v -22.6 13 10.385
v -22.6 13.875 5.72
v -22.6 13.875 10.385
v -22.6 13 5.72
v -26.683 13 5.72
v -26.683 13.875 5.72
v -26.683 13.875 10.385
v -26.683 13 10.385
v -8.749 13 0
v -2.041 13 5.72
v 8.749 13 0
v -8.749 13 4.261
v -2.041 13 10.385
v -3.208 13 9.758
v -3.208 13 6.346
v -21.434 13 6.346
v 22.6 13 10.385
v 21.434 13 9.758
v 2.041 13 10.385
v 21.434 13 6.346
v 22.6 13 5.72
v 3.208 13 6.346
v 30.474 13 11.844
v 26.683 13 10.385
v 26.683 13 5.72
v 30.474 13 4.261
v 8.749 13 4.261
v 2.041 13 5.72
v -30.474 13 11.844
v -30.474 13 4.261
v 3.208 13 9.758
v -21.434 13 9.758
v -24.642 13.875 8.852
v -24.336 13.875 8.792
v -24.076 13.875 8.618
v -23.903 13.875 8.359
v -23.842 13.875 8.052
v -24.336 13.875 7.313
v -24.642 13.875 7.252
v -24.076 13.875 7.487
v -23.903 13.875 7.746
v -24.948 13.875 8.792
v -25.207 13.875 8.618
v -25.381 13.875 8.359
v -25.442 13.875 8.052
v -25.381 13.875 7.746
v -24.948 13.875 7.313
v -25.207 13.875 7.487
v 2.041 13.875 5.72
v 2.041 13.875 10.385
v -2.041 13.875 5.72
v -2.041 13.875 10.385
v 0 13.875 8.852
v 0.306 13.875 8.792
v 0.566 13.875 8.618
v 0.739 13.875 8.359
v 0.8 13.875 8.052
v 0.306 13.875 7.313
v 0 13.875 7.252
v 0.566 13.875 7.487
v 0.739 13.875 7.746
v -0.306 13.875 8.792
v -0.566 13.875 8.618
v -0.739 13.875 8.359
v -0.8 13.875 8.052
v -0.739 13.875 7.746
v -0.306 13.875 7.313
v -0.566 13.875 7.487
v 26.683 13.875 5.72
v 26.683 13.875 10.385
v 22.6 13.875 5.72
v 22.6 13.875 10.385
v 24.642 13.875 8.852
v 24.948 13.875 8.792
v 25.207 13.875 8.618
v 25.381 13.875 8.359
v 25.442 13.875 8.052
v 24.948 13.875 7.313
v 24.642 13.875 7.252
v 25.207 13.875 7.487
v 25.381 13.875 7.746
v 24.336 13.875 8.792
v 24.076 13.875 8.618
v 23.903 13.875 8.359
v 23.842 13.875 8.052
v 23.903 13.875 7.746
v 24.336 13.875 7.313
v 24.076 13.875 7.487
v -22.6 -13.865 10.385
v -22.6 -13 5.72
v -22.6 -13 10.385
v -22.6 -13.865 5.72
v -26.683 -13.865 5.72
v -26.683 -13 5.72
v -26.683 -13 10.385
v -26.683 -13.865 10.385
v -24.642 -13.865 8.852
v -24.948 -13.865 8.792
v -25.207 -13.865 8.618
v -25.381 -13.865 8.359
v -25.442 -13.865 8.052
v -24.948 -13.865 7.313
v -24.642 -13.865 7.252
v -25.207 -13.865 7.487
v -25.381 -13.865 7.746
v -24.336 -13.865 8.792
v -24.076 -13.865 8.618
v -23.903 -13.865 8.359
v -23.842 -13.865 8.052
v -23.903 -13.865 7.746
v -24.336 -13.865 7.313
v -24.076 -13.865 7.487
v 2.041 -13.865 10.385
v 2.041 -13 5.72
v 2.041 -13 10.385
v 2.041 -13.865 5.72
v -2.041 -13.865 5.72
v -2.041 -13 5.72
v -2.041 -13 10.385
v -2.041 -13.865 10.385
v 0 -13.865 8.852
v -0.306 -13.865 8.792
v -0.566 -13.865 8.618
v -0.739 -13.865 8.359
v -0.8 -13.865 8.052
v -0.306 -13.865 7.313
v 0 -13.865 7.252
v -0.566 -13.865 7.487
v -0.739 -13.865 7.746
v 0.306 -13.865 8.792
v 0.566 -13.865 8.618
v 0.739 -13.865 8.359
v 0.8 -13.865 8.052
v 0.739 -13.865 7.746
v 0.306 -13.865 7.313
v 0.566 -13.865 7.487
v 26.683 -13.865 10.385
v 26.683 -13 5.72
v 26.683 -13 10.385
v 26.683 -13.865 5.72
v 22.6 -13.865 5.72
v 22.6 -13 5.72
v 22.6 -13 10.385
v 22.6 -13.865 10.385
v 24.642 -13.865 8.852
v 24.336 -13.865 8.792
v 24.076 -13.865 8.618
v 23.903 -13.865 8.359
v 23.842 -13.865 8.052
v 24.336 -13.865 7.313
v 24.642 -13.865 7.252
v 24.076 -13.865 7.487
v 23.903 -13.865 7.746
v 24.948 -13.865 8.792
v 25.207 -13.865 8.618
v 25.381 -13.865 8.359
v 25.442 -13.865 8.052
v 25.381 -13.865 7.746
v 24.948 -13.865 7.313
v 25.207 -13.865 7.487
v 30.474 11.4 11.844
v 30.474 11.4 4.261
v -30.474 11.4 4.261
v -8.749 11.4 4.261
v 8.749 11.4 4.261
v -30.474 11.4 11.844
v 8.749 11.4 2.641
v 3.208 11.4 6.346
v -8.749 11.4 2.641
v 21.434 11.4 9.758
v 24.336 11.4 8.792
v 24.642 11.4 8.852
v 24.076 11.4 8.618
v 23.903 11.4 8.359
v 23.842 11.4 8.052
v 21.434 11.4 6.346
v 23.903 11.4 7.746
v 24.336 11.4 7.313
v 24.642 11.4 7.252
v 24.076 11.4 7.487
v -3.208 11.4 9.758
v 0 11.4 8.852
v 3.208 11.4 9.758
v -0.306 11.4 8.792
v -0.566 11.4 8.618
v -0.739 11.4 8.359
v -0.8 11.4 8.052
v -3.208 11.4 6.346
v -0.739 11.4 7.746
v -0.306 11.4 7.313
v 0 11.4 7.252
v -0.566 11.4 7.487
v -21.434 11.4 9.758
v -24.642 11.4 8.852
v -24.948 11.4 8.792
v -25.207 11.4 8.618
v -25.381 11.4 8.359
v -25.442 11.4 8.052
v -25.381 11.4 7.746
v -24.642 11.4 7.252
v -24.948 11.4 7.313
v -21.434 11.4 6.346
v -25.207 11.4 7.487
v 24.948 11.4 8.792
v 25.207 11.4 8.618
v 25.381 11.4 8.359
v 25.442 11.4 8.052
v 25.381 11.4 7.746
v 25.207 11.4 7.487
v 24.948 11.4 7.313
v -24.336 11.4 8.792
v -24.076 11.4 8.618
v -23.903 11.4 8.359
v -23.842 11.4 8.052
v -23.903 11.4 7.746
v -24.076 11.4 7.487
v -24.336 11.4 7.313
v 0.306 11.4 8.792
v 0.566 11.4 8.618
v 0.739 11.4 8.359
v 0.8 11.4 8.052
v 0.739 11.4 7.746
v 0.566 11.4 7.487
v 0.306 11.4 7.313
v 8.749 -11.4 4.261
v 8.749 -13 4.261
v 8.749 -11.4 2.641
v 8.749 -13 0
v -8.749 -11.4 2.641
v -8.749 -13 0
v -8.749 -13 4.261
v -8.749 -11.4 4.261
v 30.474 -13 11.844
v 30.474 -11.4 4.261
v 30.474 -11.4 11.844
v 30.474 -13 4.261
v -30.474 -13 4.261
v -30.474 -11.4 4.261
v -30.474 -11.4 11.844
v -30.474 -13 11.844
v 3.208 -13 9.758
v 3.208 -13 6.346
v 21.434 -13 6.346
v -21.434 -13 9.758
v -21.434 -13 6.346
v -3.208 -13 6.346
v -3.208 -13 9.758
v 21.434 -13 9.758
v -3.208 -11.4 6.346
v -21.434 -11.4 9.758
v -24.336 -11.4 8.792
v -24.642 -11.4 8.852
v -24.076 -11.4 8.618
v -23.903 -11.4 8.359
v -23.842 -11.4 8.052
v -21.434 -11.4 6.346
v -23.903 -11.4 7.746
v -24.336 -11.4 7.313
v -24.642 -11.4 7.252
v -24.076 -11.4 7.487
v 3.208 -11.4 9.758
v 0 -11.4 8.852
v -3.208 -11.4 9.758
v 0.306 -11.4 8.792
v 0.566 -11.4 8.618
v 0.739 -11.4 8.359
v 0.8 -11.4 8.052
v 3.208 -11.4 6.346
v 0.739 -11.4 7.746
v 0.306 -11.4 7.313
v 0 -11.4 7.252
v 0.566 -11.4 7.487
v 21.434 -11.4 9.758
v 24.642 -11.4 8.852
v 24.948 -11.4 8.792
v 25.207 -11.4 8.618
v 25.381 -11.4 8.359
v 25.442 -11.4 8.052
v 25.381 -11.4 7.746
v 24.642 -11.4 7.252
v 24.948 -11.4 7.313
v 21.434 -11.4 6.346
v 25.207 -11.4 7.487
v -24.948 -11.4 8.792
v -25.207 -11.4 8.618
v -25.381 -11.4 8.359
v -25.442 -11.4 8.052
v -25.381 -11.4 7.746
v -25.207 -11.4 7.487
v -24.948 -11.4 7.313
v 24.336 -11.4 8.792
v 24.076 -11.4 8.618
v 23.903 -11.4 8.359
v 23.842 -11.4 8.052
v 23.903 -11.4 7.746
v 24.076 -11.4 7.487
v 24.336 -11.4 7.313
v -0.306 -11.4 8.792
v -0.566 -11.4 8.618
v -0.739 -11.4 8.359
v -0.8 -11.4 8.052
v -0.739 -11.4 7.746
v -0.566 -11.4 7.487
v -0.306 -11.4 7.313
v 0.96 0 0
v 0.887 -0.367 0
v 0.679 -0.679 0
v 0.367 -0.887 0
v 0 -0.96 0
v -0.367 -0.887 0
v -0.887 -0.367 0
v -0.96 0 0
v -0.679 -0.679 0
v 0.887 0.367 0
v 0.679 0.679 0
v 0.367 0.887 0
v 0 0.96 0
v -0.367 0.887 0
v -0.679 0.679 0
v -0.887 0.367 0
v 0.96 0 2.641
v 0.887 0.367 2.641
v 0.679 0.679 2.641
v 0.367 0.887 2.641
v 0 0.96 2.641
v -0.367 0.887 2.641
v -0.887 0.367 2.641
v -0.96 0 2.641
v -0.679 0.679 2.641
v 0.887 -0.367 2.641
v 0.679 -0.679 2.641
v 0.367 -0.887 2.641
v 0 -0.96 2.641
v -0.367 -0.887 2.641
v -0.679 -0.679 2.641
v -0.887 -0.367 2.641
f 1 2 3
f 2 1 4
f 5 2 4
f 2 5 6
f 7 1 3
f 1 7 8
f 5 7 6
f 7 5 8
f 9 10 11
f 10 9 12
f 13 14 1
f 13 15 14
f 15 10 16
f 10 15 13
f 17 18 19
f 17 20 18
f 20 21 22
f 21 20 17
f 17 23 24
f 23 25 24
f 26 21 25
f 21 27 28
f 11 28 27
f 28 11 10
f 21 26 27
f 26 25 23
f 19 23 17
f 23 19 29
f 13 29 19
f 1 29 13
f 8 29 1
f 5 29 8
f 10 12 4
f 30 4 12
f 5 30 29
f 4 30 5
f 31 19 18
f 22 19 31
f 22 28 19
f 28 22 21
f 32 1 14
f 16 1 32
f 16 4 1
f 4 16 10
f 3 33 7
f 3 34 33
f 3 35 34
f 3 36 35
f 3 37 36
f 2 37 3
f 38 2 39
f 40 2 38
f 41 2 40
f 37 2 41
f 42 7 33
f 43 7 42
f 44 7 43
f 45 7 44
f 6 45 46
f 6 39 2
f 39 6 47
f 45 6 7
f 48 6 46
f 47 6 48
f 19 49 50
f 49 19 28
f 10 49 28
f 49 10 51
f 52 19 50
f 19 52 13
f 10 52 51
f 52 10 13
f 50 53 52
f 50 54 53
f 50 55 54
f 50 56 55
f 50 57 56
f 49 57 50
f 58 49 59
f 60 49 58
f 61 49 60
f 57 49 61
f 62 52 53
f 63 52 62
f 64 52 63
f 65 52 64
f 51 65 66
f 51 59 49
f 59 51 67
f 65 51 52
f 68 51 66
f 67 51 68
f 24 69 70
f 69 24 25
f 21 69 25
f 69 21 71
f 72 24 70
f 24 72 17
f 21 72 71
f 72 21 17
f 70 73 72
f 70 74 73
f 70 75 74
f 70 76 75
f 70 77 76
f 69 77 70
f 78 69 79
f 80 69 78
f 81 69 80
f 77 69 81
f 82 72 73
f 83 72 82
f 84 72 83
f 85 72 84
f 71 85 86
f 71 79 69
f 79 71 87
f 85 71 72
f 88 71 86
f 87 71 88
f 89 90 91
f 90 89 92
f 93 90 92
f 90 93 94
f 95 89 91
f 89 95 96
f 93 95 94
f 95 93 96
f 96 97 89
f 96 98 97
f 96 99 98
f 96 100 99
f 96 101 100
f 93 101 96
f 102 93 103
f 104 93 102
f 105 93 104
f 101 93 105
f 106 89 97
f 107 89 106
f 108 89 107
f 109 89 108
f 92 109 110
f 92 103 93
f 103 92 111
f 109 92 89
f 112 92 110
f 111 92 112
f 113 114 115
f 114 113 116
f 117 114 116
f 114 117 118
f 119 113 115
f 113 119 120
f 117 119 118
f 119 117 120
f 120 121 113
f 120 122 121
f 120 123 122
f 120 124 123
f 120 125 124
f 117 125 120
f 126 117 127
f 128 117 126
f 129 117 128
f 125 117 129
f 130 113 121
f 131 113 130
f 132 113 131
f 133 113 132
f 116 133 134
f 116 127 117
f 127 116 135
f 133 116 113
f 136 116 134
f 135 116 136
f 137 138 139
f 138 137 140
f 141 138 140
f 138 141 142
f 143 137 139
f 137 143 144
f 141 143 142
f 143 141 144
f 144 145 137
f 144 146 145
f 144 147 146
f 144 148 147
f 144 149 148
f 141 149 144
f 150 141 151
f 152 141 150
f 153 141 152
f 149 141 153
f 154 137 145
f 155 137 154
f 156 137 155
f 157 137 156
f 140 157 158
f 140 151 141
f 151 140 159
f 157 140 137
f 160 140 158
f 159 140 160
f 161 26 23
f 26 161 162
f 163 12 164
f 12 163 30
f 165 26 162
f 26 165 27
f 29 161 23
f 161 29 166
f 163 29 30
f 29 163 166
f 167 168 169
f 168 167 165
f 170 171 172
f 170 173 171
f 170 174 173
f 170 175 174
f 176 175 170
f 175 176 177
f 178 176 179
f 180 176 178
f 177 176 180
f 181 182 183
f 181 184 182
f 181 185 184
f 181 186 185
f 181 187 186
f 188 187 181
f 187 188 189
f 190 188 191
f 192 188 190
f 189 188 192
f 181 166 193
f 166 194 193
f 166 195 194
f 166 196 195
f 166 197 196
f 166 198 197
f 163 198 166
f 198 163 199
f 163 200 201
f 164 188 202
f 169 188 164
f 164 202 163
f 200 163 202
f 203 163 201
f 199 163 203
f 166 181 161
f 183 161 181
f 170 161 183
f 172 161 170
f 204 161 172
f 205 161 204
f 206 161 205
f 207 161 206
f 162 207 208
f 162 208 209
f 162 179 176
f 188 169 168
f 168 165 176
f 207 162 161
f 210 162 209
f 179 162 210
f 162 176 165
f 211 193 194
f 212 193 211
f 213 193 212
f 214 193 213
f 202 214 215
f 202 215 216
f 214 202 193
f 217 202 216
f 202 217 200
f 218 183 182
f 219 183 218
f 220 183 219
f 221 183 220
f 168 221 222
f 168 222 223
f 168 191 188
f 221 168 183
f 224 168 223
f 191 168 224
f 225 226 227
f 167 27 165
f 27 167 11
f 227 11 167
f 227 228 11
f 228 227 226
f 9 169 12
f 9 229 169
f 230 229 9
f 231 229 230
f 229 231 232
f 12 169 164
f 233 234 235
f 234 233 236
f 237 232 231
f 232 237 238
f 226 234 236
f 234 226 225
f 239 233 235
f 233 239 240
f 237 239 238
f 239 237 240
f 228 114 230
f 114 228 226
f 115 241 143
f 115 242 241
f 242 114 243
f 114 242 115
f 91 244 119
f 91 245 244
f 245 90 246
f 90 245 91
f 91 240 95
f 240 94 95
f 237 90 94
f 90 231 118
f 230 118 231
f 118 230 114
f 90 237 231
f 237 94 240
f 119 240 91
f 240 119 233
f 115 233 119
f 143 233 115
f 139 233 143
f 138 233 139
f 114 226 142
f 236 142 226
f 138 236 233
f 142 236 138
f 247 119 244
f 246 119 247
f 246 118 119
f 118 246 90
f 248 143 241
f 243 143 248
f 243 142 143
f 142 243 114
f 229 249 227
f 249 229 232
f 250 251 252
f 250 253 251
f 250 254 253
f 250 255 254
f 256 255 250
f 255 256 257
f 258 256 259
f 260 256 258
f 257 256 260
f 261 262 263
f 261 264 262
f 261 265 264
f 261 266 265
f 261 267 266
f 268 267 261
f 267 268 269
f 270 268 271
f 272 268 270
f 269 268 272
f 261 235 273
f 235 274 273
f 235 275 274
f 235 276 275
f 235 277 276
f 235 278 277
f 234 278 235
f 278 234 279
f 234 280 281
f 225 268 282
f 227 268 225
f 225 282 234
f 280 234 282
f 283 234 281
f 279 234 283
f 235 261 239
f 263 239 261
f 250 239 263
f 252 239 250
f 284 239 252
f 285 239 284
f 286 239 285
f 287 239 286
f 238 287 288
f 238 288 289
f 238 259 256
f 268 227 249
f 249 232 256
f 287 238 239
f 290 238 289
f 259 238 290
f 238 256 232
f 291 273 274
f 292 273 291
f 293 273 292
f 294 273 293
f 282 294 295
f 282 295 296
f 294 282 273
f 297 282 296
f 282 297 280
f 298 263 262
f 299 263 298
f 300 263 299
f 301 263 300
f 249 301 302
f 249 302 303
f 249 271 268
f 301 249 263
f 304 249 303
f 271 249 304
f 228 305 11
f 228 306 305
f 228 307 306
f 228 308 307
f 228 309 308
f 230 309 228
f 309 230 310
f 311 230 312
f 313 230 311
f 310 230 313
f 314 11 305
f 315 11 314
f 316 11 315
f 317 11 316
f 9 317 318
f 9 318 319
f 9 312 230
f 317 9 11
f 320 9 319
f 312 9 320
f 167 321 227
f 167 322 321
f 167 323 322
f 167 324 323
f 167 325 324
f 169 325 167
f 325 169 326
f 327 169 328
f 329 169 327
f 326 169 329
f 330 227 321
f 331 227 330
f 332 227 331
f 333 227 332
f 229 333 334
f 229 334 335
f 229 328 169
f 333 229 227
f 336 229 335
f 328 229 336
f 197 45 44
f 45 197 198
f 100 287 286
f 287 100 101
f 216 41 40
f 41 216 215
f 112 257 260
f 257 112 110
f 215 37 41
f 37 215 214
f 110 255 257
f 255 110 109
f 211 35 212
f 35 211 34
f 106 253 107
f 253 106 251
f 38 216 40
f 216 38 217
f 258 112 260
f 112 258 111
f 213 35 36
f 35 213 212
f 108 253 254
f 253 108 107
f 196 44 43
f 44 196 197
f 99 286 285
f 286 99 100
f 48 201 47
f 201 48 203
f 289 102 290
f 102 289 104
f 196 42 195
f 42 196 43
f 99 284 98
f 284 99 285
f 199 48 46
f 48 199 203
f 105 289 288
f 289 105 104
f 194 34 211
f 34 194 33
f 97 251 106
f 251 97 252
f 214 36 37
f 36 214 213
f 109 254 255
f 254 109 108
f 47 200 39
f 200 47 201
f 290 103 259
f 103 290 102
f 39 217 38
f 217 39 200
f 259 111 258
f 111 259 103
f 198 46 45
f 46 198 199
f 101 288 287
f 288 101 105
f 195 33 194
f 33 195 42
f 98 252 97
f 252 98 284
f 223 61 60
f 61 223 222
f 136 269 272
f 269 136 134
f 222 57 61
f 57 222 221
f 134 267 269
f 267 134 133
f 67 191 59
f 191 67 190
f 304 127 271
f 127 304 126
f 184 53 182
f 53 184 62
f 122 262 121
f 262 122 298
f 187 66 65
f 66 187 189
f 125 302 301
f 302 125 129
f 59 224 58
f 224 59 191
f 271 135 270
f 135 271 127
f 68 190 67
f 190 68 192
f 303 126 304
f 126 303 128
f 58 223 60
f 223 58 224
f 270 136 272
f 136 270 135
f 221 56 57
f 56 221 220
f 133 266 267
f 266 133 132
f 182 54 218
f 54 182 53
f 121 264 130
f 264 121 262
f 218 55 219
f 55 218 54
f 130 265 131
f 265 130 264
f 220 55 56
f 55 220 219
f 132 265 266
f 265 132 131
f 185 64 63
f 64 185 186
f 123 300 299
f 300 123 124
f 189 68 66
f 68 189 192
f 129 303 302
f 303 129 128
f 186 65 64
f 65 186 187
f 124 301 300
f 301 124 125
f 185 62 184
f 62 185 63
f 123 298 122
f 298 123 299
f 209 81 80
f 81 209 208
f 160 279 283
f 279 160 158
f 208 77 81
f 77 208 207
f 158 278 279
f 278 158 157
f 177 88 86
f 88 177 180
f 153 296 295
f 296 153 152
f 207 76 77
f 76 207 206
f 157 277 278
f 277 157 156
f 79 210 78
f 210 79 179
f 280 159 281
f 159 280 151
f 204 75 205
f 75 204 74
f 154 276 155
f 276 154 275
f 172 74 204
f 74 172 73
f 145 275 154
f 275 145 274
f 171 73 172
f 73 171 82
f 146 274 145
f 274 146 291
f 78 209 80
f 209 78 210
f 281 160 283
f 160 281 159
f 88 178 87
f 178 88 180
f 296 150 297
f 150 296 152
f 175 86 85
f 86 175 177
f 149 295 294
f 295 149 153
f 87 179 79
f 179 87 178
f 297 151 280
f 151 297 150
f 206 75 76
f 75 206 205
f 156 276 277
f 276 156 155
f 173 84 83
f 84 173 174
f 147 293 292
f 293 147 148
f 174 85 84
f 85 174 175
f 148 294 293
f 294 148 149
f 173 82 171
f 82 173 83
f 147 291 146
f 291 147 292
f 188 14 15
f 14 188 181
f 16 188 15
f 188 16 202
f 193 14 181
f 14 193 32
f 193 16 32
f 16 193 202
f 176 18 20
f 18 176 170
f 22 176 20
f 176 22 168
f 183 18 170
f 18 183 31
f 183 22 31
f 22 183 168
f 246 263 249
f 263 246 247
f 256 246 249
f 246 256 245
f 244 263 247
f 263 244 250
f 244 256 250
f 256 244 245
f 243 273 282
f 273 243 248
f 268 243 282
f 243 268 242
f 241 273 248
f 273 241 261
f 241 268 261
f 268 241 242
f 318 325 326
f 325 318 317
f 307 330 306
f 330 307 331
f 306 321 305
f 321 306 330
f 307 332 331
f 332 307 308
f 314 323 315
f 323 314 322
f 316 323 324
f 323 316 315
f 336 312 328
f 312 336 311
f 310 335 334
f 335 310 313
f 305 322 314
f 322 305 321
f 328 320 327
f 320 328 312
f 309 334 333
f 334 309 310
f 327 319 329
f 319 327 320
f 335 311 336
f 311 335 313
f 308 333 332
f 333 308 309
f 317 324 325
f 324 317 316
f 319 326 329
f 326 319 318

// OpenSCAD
// file: ../../library/e7_all.scad
// ==========================================================================
//  e7_all.scad - include this one file. Preview, print plates and the report.
// ==========================================================================
include <e7_params.scad>
include <e7_body.scad>

// whole painted loco
module e7_preview() {
  // carbody in its paint bands
  for (i = [0:len(PAINT_BANDS) - 1]) {
    z0 = i == 0 ? -1 : p(PAINT_BANDS[i - 1][0]);
    z1 = i == len(PAINT_BANDS) - 1 ? 1000 : p(PAINT_BANDS[i][0]);
    color(PAINT_BANDS[i][1]) render(convexity = 8) e7_shell_solid([z0, z1]);
  }
  color(C_GLASS) e7_glass();
  color(C_LENS) let (d = nose_d_at_z(HEADLIGHT[0]))
    translate([XF - p(d) + p(HEADLIGHT[2]) + p(1.5), 0, p(HEADLIGHT[0])]) rotate([0, 90, 0]) cylinder(d = p(HEADLIGHT[1]) - 0.8, h = 0.5, $fn = 32);
  color(C_FRAME) { for (j = [1:NFRAME]) e7_frame_piece(j); e7_pilot(); e7_pilot_rear(); }
  for (tx = [TRK_X, -TRK_X]) translate([tx, 0, 0]) { color(C_TRUCK) e7_truck_frame(); color(C_WHEEL) e7_wheels(); }
}
// thin glass panes sitting in the window pockets (preview only)
module e7_glass() {
  intersection() { e7_loft(DET * 0.6); union() { e7_windshield_cut(); e7_side_cuts_windows_only(); } }
}
module e7_side_cuts_windows_only() {
  for (s = [-1, 1], w = CAB_WIN)
    translate([XF - p(w[1]), s * HW - (s > 0 ? DET : 3 - DET), p(w[2])]) cube([p(w[1] - w[0]), 3, p(w[3] - w[2])]);
}

// one print, laid out for the printer
module e7_plate(part) {
  sec = [for (k = [1:NSEC]) str("body_", k)];
  frm = [for (j = [1:NFRAME]) str("frame_", j)];
  if (is_num(search([part], sec)[0])) {
    k = search([part], sec)[0] + 1;
    // stand the section on its open bottom (skirt edge on the bed)
    translate([-sec_x0(k) - SEC_L / 2, 0, -Z_SKIRT]) e7_body_section(k);
  } else if (is_num(search([part], frm)[0])) {
    j = search([part], frm)[0] + 1;
    xs = concat([FRAME_X0], FRAME_SPLITS, [FRAME_X1]);
    translate([-(xs[j - 1] + xs[j]) / 2, 0, -Z_FRAME_BOT]) e7_frame_piece(j);
  } else if (part == "pilot") {
    translate([-XF, 0, 0]) rotate([0, 0, 0]) translate([0, 0, -p(5)]) e7_pilot();
  } else if (part == "pilot_rear") {
    translate([-XR, 0, 0]) translate([0, 0, -(CPL_Z - CPL_H / 2 - WALL)]) e7_pilot_rear();
  } else if (part == "truck") {
    // upside down, bolster on the bed
    translate([0, 0, Z_FRAME_BOT - 0.3]) rotate([180, 0, 0]) e7_truck_frame();
  } else {
    assert(false, str("unknown part '", part, "'"));
  }
}

module e7_report() {
  echo(str("MILW E7A ", ROAD_NO, " class ", CLASS, " - ", SC, " scale 1:", RATIO, ", paint ", PAINT));
  echo(str("  carbody ", round(BL), " mm long, ", round(2 * HW), " mm wide, roof ", round(Z_ROOF), " mm, cab ", round(Z_CAB), " mm above rail"));
  echo(str("  ", NSEC, " body sections of ", round(SEC_L), " mm; ", NFRAME, " frame pieces; trucks at +/- ", round(TRK_X), " mm"));
  echo(str("  body screws ", SCREW_BODY_NAME, " x ", 2 * len(BOSS_X), "; truck pivots ", PIVOT[1], "; wheels ", round(WHEEL_D * 10) / 10, " mm (bought)"));
}
// main file
// Milwaukee Road E7A, HO scale 1-87 - print 6 of 6: truck - A1A truck frame (print bolster down; make 2)
// Render (F6), export STL, print. Settings: ../../library/e7_params.scad
// Whole loco preview and notes: ../../MILW_E7_Main.scad
SCALE_SEL = "HO";
include <../../library/e7_all.scad>
e7_plate("truck");
